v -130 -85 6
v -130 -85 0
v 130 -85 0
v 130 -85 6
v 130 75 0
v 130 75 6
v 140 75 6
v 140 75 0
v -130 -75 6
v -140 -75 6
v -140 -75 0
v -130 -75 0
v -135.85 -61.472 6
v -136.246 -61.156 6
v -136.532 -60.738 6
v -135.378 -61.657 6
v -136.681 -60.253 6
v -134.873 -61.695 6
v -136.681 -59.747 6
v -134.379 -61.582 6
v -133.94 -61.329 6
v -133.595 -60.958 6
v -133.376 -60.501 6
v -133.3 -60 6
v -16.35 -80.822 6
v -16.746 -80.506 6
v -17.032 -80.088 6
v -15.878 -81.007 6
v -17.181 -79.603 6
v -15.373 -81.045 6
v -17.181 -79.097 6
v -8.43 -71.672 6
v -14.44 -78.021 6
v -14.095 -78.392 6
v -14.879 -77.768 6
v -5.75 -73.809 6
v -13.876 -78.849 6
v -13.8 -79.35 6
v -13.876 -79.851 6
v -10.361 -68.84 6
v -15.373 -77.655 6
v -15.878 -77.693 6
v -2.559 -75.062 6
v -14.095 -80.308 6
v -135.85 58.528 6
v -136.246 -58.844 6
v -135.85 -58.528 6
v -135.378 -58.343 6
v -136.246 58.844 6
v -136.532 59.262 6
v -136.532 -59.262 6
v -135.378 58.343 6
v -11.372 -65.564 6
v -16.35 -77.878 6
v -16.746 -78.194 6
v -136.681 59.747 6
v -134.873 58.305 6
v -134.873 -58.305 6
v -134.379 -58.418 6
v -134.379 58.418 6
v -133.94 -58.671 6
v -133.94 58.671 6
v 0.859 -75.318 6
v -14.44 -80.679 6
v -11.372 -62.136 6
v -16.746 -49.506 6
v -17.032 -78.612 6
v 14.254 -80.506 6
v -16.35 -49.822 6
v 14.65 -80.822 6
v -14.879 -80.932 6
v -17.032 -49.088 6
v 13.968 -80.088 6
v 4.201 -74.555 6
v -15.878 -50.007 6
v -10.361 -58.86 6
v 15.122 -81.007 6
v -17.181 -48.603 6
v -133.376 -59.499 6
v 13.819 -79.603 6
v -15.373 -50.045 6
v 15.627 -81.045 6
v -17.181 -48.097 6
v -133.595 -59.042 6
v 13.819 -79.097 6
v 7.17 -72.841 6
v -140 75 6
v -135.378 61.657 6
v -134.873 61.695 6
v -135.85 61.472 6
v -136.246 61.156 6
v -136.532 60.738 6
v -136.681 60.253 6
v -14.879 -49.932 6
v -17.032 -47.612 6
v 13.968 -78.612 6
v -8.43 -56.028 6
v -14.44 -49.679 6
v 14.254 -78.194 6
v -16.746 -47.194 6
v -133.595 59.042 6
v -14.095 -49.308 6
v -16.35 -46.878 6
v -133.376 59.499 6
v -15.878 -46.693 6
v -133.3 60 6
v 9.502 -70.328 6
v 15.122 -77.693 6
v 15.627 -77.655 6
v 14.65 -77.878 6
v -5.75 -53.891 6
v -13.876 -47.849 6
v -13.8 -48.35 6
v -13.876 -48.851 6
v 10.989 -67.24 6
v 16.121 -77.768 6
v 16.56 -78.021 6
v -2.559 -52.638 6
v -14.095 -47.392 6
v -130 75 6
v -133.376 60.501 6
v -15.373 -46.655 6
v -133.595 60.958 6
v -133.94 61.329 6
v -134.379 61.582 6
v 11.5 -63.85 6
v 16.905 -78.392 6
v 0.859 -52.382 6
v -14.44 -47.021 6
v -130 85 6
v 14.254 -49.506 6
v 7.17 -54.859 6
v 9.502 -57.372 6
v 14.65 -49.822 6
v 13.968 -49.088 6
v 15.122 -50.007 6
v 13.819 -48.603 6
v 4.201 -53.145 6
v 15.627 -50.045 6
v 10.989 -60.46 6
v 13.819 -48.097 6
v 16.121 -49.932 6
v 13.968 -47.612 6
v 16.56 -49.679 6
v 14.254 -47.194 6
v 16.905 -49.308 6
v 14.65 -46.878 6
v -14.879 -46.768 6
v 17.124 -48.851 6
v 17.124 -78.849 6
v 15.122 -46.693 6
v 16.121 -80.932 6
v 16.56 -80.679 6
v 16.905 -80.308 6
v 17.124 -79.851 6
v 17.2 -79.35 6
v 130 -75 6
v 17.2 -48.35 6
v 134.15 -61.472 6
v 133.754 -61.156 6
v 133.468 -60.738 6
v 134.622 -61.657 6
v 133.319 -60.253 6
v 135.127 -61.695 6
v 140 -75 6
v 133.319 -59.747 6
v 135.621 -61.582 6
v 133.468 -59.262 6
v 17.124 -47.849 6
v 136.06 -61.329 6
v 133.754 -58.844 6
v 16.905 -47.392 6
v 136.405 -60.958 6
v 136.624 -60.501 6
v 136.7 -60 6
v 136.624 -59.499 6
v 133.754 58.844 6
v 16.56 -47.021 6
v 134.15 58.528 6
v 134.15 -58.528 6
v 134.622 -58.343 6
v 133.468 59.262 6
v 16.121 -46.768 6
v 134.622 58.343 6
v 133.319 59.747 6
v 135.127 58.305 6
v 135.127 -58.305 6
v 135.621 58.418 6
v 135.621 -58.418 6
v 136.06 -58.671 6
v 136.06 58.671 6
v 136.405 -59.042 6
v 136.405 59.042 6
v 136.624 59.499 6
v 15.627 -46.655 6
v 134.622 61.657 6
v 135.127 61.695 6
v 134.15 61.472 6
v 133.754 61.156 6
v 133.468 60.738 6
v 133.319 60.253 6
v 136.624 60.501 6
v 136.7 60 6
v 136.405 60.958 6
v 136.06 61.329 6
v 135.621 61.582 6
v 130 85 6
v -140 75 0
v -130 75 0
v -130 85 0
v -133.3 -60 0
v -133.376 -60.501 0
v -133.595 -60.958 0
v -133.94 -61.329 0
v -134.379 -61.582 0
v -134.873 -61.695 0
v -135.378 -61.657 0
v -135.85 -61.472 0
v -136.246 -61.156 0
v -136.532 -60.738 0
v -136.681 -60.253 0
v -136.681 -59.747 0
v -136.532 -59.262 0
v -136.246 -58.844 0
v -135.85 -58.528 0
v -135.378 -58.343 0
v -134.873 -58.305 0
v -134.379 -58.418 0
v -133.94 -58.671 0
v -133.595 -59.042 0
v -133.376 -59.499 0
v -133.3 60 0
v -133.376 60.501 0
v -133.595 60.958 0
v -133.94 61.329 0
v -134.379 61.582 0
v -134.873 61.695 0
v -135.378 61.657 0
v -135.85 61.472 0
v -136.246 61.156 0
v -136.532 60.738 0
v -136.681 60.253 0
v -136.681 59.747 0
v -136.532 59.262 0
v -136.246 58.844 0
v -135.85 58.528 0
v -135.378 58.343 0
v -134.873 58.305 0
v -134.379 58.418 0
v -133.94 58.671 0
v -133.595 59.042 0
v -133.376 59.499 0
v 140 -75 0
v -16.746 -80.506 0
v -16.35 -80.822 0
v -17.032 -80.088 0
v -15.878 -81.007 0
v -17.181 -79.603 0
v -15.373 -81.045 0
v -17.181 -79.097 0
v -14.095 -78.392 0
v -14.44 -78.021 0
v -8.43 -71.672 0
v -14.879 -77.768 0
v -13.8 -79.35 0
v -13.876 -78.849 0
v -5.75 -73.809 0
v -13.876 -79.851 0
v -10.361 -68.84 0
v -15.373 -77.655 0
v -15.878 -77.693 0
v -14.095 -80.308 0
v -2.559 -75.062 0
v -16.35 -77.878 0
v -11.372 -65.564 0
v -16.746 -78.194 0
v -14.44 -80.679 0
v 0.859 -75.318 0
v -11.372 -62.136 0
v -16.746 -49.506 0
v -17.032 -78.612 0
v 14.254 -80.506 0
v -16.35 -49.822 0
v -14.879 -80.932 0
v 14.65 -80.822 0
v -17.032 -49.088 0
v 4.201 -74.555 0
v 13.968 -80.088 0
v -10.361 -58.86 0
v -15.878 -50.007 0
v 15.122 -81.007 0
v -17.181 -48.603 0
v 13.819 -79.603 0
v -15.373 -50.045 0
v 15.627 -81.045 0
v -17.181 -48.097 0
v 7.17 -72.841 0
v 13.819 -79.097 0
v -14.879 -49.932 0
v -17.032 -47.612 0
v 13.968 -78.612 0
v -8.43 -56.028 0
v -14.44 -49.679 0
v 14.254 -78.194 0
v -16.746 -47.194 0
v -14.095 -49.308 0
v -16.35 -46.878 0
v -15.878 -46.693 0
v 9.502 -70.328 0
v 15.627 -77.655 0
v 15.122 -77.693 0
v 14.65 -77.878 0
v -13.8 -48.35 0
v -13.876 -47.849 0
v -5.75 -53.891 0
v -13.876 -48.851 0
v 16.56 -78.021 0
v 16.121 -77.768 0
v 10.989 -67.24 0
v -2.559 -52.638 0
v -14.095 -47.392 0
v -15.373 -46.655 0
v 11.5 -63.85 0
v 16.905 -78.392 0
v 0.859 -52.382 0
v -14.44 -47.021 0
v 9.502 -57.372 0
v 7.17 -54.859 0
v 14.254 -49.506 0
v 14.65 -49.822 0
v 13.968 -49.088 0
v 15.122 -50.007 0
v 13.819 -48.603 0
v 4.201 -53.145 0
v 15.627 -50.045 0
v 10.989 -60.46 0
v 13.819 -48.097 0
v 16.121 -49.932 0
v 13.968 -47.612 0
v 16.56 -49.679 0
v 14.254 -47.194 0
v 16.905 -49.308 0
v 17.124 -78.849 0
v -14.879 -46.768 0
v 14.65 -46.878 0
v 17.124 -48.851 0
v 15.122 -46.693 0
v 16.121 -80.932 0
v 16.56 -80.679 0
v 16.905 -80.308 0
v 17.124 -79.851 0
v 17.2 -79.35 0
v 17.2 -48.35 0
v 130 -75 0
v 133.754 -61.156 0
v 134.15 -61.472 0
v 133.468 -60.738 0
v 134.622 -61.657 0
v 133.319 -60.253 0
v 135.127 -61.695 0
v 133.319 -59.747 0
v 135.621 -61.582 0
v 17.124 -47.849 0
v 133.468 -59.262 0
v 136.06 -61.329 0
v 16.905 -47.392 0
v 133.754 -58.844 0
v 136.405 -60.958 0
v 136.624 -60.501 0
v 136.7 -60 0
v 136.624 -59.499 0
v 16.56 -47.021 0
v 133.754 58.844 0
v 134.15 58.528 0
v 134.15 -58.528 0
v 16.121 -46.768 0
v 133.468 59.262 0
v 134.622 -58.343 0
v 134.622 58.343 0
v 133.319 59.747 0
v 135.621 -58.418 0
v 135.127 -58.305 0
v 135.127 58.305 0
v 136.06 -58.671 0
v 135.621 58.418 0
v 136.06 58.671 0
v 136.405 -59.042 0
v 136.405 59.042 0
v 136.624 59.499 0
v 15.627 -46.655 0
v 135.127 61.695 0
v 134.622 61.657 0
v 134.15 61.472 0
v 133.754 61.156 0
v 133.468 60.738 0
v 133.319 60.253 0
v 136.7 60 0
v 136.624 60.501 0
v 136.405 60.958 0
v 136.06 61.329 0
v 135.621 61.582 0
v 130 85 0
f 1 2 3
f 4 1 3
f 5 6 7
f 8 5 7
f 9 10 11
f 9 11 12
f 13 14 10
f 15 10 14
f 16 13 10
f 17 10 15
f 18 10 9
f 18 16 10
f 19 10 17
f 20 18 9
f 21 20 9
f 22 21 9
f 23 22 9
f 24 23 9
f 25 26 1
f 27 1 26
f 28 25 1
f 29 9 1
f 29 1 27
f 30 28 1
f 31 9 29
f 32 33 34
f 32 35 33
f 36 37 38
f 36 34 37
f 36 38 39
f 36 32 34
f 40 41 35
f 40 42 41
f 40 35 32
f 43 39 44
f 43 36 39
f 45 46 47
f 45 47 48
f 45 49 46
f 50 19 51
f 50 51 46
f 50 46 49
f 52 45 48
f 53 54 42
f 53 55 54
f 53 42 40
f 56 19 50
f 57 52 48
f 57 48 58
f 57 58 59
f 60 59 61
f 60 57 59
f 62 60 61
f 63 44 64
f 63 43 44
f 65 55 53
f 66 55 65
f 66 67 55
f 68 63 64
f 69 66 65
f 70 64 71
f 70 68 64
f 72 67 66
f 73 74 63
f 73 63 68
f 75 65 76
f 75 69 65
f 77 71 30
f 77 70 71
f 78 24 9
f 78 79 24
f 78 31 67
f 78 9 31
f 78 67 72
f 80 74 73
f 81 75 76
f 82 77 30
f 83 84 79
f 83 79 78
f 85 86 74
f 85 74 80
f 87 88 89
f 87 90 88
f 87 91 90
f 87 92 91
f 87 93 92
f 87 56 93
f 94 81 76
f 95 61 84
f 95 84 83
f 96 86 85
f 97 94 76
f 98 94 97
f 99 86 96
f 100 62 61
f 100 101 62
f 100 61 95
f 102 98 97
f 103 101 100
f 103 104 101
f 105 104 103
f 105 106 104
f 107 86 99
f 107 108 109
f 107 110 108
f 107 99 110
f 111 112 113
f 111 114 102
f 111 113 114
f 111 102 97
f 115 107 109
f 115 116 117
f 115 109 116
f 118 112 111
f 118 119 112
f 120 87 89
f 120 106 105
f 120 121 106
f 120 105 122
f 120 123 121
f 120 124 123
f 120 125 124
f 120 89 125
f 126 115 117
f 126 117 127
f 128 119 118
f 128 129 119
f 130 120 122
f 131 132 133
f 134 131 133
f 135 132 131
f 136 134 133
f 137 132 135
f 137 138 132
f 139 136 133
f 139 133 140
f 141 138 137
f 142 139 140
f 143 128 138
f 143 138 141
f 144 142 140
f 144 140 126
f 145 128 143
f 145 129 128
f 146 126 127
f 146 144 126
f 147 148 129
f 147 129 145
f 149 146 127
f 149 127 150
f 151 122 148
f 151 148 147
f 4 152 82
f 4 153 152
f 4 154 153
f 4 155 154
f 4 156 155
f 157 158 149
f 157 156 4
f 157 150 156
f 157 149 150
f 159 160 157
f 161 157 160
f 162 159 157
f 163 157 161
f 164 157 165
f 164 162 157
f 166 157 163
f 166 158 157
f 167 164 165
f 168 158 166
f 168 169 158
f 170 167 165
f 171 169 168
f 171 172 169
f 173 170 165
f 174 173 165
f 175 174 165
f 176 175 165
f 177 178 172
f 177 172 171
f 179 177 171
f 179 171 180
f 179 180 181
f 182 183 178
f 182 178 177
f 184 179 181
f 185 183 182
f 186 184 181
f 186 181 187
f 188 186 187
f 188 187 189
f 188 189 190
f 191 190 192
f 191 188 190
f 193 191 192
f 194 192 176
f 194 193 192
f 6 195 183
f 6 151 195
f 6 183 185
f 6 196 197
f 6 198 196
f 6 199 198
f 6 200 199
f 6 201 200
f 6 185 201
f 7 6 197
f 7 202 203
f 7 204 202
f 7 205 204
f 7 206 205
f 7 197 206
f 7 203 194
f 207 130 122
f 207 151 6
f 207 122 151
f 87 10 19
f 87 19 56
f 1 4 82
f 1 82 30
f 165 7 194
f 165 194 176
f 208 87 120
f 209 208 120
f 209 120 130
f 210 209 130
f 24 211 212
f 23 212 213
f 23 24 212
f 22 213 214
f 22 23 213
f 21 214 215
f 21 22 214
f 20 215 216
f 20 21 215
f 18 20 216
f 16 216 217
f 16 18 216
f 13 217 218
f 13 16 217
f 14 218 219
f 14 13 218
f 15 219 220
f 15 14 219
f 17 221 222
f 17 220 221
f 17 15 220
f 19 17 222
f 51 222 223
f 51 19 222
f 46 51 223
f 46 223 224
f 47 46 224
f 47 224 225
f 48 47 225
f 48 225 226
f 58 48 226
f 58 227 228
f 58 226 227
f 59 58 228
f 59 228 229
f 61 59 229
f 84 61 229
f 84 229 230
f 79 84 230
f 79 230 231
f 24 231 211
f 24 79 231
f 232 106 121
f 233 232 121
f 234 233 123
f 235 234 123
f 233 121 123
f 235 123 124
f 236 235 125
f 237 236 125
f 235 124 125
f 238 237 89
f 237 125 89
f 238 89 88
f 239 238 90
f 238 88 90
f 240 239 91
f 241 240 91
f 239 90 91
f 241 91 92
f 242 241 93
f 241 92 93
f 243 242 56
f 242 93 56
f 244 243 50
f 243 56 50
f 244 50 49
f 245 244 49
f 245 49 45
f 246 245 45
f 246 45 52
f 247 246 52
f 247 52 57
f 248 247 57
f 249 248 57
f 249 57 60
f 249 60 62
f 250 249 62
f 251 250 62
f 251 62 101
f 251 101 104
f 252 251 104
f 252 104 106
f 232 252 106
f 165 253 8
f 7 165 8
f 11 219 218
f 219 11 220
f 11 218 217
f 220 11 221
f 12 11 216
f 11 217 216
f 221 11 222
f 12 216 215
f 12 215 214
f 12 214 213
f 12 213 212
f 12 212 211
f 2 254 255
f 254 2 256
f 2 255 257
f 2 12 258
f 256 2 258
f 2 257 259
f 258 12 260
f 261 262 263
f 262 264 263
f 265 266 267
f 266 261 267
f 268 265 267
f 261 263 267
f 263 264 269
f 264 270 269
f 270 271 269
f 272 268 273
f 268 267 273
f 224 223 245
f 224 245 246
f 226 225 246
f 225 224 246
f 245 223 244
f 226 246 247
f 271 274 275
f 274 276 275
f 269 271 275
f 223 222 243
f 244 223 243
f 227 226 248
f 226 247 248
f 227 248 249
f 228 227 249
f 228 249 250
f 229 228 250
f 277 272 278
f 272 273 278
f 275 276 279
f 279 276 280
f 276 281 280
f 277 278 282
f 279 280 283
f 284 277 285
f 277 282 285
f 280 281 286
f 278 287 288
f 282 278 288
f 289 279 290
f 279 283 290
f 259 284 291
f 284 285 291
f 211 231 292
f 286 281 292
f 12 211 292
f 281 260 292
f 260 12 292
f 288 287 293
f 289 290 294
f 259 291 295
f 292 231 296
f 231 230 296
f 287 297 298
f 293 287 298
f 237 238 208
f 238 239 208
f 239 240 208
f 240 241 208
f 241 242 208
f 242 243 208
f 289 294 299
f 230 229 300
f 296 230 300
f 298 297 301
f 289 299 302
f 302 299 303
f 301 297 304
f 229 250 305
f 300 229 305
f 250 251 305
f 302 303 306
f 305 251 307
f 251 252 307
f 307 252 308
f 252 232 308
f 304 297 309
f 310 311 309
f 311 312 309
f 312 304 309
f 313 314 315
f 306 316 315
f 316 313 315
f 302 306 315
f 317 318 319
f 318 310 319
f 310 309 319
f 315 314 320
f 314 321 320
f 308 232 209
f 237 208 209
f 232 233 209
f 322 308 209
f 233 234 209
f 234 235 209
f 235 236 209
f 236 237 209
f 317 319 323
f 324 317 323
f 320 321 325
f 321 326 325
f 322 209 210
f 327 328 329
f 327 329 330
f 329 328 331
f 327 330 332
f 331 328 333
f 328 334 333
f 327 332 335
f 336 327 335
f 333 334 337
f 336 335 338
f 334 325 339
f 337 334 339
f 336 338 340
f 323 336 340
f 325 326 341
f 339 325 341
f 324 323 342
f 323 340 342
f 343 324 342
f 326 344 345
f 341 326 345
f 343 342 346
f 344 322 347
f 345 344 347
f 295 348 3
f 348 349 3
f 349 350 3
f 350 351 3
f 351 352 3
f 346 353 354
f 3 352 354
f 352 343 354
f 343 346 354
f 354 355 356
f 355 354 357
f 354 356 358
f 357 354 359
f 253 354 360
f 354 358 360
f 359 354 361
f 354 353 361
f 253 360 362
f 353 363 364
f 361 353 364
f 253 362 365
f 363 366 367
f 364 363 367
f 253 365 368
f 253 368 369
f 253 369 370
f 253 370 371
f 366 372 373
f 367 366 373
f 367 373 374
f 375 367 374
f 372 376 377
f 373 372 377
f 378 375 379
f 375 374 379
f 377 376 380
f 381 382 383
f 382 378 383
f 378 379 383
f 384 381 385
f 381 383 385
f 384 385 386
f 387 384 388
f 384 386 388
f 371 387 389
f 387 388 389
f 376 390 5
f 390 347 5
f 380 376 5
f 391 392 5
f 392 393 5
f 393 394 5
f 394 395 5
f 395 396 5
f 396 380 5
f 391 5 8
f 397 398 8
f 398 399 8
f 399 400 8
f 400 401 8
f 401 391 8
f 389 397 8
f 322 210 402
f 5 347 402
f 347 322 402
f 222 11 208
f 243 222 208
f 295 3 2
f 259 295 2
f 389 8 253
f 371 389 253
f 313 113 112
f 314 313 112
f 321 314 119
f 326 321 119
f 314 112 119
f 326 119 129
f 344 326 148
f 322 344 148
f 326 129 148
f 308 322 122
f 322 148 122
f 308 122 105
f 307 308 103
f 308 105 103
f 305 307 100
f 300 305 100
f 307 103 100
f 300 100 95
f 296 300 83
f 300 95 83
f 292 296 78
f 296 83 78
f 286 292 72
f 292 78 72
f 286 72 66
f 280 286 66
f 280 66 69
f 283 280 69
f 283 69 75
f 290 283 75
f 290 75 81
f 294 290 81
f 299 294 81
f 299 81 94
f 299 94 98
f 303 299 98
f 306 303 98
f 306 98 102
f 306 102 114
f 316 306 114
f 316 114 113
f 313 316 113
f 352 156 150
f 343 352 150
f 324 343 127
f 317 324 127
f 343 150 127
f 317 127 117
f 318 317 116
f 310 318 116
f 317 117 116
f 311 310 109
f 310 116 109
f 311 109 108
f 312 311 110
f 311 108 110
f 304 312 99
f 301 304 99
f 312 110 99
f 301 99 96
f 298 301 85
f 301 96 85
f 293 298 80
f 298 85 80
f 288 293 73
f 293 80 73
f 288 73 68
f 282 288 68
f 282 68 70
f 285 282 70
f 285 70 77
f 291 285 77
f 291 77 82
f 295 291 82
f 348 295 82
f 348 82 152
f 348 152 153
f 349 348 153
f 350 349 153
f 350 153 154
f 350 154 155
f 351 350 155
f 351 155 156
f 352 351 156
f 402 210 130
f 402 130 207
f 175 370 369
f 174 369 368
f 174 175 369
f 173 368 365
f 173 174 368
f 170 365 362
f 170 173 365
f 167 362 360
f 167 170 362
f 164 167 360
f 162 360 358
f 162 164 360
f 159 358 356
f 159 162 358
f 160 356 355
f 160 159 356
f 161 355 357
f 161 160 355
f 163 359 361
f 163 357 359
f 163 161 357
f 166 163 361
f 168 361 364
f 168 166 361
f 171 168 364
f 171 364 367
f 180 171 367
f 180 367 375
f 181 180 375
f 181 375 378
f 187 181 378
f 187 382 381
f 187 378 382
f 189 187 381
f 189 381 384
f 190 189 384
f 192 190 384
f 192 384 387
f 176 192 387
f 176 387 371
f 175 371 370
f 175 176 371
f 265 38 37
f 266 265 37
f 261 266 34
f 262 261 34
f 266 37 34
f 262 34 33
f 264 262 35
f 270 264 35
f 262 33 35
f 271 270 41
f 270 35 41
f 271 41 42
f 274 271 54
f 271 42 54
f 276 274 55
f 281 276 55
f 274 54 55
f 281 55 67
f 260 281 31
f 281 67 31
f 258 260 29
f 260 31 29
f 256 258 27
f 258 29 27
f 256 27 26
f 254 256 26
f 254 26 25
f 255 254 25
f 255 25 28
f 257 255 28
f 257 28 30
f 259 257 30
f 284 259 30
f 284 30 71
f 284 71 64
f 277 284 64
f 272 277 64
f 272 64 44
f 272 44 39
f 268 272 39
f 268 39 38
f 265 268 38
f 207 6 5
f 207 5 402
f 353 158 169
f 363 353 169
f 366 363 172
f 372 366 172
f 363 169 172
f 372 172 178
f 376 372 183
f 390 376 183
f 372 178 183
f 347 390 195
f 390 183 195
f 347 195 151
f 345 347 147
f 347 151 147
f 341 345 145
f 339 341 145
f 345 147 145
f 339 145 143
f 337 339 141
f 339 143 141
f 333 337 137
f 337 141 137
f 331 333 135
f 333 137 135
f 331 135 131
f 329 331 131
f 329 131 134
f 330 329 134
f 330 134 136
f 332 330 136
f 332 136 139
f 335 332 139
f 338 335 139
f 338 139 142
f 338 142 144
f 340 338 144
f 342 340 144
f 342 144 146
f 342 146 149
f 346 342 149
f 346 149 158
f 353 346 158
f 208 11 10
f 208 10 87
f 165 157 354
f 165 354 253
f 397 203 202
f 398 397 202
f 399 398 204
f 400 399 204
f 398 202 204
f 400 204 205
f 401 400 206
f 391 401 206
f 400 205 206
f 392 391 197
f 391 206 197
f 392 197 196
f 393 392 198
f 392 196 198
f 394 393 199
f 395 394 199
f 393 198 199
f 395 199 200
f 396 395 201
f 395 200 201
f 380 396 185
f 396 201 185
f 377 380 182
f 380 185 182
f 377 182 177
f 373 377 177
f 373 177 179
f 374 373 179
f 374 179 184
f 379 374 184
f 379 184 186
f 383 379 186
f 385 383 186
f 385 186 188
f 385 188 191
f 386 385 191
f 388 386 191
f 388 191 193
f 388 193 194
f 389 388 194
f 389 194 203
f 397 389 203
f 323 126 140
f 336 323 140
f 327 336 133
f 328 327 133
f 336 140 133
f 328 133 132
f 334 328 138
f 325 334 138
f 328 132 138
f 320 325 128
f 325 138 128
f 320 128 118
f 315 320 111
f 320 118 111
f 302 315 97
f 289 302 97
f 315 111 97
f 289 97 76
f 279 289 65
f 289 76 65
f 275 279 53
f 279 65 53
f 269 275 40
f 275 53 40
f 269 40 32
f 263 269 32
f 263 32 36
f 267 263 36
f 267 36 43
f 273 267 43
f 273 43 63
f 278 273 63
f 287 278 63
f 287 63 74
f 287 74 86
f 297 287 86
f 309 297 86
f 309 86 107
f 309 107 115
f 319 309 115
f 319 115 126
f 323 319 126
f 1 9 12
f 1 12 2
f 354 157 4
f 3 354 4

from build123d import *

# Parameters (mm, degrees)
SKETCH_W        = 280
SKETCH_H        = 170
PAD_DEPTH       = 6
SKETCH001_R     = 1.7
SKETCH001_W     = 10
SKETCH001_H     = 10
POCKET_DEPTH    = 661.244466
SKETCH002_R     = 1.7
SKETCH002_R_2   = 11.5
POCKET001_DEPTH = 6.001


with BuildPart() as part:
    # Sketch → Pad (new body)
    with BuildSketch(Plane.XY):
        Rectangle(SKETCH_W, SKETCH_H)
    extrude(amount=PAD_DEPTH)

    # Sketch001 (on Face6 of Pad) → Pocket (cut, through all)
    with BuildSketch(Plane.XY.offset(6)):
        with Locations((-135, 60)):
            Circle(SKETCH001_R)
        with Locations((135, 60)):
            Circle(SKETCH001_R)
        with Locations((-135, 80)):
            Rectangle(SKETCH001_W, SKETCH001_H)
        with Locations((135, 80)):
            Rectangle(SKETCH001_W, SKETCH001_H)
    pocket = extrude(amount=-POCKET_DEPTH, mode=Mode.SUBTRACT)

    # Mirrored: Pocket across Sketch001 H_Axis
    add(pocket.mirror(Plane(origin=(0, 0, 6), x_dir=(0, 0, 1), z_dir=(0, 1, 0))), mode=Mode.SUBTRACT)

    # Sketch002 (on Face4 of Mirrored) → Pocket001 (cut, through all)
    with BuildSketch(Plane.XY.offset(6)):
        with Locations((-15.5, -48.35)):
            Circle(SKETCH002_R)
        with Locations((15.5, -48.35)):
            Circle(SKETCH002_R)
        with Locations((15.5, -79.35)):
            Circle(SKETCH002_R)
        with Locations((-15.5, -79.35)):
            Circle(SKETCH002_R)
        with Locations((0, -63.85)):
            Circle(SKETCH002_R_2)
    extrude(amount=-POCKET001_DEPTH, mode=Mode.SUBTRACT)


solid = part.part
